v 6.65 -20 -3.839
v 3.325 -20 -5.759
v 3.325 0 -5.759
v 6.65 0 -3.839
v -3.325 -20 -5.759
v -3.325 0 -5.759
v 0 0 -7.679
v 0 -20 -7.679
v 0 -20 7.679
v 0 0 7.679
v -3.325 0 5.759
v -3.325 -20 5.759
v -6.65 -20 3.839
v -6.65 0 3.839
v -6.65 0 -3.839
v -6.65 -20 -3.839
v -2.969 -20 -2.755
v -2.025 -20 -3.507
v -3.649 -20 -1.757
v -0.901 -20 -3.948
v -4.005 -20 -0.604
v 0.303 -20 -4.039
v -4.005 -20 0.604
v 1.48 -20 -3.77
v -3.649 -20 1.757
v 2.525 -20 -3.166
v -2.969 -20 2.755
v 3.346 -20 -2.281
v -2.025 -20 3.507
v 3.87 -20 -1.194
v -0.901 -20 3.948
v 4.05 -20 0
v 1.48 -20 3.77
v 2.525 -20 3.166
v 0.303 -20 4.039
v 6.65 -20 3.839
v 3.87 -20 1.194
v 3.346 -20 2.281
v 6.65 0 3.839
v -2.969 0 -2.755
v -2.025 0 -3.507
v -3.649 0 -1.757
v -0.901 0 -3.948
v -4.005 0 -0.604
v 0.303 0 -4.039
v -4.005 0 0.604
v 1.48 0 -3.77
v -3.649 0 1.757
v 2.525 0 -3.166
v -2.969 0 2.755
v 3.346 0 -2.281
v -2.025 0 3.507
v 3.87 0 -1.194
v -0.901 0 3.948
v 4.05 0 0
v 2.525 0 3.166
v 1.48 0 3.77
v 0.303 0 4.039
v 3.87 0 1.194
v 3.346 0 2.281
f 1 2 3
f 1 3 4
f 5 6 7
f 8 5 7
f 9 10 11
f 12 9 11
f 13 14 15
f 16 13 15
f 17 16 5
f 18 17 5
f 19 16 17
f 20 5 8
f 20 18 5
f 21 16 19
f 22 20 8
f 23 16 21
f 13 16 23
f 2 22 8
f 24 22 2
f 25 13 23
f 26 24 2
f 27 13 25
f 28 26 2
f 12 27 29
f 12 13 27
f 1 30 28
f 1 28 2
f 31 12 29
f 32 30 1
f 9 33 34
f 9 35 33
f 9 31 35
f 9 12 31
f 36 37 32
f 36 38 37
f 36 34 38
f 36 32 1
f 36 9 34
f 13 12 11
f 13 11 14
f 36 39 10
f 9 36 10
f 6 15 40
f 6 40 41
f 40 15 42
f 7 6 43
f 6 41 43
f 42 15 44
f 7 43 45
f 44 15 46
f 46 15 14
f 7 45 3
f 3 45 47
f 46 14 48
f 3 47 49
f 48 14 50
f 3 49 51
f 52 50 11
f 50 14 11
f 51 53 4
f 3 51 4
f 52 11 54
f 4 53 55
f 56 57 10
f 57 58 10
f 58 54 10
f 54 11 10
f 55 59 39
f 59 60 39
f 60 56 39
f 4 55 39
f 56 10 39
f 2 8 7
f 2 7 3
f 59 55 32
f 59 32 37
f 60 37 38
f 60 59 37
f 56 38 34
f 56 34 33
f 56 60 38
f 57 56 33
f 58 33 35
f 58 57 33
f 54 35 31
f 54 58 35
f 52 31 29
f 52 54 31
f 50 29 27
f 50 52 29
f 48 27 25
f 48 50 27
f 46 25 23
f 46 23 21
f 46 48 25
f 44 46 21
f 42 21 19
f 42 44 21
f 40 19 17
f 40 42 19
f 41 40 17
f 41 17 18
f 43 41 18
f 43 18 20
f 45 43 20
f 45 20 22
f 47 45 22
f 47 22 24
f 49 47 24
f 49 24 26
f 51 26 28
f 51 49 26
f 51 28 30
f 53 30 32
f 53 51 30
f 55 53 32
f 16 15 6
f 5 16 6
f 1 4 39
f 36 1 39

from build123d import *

# Parameters (mm, degrees)
F0_R     = 4.05
F1_DEPTH = 20


with BuildPart() as f1:
    # F0 (on Front) → F1 (new body)
    with BuildSketch(Plane.XZ):
        with BuildLine():
            Line((3.3250001364, 5.7590688564), (0, 7.6787585802))
            Line((0, 7.6787585802), (-3.3249999524, 5.7590689627))
            ThreePointArc((-3.3249999524, 5.7590689627), (1.062e-07, 6.65), (3.3250001364, 5.7590688564))
        make_face()
        with BuildLine():
            Line((6.65, 3.8393792901), (3.3250001364, 5.7590688564))
            ThreePointArc((3.3250001364, 5.7590688564), (5.7590689745, 3.3249999318), (6.65, 0))
            Line((6.65, 0), (6.65, 3.8393792901))
        make_face()
        with BuildLine():
            ThreePointArc((6.65, 0), (5.7590689745, 3.3249999318), (3.3250001364, 5.7590688564))
            ThreePointArc((3.3250001364, 5.7590688564), (1.062e-07, 6.65), (-3.3249999524, 5.7590689627))
            ThreePointArc((-3.3249999524, 5.7590689627), (-5.7590689214, 3.3250000238), (-6.65, 0))
            ThreePointArc((-6.65, 0), (-5.7590689227, -3.3250000216), (-3.3249999568, -5.7590689601))
            ThreePointArc((-3.3249999568, -5.7590689601), (2.14e-08, -6.65), (3.3249999939, -5.7590689387))
            ThreePointArc((3.3249999939, -5.7590689387), (5.7590689334, -3.3250000031), (6.65, 0))
        make_face()
        Circle(F0_R, mode=Mode.SUBTRACT)
        with BuildLine():
            ThreePointArc((-6.65, 0), (-5.7590689214, 3.3250000238), (-3.3249999524, 5.7590689627))
            Line((-3.3249999524, 5.7590689627), (-6.65, 3.8393792901))
            Line((-6.65, 3.8393792901), (-6.65, 0))
        make_face()
        with BuildLine():
            Line((6.65, -3.8393792901), (6.65, 0))
            ThreePointArc((6.65, 0), (5.7590689334, -3.3250000031), (3.3249999939, -5.7590689387))
            Line((3.3249999939, -5.7590689387), (6.65, -3.8393792901))
        make_face()
        with BuildLine():
            ThreePointArc((-3.3249999568, -5.7590689601), (-5.7590689227, -3.3250000216), (-6.65, 0))
            Line((-6.65, 0), (-6.65, -3.8393792901))
            Line((-6.65, -3.8393792901), (-3.3249999568, -5.7590689601))
        make_face()
        with BuildLine():
            Line((0, -7.6787585802), (3.3249999939, -5.7590689387))
            ThreePointArc((3.3249999939, -5.7590689387), (2.14e-08, -6.65), (-3.3249999568, -5.7590689601))
            Line((-3.3249999568, -5.7590689601), (0, -7.6787585802))
        make_face()
    extrude(amount=F1_DEPTH)


solid = f1.part
